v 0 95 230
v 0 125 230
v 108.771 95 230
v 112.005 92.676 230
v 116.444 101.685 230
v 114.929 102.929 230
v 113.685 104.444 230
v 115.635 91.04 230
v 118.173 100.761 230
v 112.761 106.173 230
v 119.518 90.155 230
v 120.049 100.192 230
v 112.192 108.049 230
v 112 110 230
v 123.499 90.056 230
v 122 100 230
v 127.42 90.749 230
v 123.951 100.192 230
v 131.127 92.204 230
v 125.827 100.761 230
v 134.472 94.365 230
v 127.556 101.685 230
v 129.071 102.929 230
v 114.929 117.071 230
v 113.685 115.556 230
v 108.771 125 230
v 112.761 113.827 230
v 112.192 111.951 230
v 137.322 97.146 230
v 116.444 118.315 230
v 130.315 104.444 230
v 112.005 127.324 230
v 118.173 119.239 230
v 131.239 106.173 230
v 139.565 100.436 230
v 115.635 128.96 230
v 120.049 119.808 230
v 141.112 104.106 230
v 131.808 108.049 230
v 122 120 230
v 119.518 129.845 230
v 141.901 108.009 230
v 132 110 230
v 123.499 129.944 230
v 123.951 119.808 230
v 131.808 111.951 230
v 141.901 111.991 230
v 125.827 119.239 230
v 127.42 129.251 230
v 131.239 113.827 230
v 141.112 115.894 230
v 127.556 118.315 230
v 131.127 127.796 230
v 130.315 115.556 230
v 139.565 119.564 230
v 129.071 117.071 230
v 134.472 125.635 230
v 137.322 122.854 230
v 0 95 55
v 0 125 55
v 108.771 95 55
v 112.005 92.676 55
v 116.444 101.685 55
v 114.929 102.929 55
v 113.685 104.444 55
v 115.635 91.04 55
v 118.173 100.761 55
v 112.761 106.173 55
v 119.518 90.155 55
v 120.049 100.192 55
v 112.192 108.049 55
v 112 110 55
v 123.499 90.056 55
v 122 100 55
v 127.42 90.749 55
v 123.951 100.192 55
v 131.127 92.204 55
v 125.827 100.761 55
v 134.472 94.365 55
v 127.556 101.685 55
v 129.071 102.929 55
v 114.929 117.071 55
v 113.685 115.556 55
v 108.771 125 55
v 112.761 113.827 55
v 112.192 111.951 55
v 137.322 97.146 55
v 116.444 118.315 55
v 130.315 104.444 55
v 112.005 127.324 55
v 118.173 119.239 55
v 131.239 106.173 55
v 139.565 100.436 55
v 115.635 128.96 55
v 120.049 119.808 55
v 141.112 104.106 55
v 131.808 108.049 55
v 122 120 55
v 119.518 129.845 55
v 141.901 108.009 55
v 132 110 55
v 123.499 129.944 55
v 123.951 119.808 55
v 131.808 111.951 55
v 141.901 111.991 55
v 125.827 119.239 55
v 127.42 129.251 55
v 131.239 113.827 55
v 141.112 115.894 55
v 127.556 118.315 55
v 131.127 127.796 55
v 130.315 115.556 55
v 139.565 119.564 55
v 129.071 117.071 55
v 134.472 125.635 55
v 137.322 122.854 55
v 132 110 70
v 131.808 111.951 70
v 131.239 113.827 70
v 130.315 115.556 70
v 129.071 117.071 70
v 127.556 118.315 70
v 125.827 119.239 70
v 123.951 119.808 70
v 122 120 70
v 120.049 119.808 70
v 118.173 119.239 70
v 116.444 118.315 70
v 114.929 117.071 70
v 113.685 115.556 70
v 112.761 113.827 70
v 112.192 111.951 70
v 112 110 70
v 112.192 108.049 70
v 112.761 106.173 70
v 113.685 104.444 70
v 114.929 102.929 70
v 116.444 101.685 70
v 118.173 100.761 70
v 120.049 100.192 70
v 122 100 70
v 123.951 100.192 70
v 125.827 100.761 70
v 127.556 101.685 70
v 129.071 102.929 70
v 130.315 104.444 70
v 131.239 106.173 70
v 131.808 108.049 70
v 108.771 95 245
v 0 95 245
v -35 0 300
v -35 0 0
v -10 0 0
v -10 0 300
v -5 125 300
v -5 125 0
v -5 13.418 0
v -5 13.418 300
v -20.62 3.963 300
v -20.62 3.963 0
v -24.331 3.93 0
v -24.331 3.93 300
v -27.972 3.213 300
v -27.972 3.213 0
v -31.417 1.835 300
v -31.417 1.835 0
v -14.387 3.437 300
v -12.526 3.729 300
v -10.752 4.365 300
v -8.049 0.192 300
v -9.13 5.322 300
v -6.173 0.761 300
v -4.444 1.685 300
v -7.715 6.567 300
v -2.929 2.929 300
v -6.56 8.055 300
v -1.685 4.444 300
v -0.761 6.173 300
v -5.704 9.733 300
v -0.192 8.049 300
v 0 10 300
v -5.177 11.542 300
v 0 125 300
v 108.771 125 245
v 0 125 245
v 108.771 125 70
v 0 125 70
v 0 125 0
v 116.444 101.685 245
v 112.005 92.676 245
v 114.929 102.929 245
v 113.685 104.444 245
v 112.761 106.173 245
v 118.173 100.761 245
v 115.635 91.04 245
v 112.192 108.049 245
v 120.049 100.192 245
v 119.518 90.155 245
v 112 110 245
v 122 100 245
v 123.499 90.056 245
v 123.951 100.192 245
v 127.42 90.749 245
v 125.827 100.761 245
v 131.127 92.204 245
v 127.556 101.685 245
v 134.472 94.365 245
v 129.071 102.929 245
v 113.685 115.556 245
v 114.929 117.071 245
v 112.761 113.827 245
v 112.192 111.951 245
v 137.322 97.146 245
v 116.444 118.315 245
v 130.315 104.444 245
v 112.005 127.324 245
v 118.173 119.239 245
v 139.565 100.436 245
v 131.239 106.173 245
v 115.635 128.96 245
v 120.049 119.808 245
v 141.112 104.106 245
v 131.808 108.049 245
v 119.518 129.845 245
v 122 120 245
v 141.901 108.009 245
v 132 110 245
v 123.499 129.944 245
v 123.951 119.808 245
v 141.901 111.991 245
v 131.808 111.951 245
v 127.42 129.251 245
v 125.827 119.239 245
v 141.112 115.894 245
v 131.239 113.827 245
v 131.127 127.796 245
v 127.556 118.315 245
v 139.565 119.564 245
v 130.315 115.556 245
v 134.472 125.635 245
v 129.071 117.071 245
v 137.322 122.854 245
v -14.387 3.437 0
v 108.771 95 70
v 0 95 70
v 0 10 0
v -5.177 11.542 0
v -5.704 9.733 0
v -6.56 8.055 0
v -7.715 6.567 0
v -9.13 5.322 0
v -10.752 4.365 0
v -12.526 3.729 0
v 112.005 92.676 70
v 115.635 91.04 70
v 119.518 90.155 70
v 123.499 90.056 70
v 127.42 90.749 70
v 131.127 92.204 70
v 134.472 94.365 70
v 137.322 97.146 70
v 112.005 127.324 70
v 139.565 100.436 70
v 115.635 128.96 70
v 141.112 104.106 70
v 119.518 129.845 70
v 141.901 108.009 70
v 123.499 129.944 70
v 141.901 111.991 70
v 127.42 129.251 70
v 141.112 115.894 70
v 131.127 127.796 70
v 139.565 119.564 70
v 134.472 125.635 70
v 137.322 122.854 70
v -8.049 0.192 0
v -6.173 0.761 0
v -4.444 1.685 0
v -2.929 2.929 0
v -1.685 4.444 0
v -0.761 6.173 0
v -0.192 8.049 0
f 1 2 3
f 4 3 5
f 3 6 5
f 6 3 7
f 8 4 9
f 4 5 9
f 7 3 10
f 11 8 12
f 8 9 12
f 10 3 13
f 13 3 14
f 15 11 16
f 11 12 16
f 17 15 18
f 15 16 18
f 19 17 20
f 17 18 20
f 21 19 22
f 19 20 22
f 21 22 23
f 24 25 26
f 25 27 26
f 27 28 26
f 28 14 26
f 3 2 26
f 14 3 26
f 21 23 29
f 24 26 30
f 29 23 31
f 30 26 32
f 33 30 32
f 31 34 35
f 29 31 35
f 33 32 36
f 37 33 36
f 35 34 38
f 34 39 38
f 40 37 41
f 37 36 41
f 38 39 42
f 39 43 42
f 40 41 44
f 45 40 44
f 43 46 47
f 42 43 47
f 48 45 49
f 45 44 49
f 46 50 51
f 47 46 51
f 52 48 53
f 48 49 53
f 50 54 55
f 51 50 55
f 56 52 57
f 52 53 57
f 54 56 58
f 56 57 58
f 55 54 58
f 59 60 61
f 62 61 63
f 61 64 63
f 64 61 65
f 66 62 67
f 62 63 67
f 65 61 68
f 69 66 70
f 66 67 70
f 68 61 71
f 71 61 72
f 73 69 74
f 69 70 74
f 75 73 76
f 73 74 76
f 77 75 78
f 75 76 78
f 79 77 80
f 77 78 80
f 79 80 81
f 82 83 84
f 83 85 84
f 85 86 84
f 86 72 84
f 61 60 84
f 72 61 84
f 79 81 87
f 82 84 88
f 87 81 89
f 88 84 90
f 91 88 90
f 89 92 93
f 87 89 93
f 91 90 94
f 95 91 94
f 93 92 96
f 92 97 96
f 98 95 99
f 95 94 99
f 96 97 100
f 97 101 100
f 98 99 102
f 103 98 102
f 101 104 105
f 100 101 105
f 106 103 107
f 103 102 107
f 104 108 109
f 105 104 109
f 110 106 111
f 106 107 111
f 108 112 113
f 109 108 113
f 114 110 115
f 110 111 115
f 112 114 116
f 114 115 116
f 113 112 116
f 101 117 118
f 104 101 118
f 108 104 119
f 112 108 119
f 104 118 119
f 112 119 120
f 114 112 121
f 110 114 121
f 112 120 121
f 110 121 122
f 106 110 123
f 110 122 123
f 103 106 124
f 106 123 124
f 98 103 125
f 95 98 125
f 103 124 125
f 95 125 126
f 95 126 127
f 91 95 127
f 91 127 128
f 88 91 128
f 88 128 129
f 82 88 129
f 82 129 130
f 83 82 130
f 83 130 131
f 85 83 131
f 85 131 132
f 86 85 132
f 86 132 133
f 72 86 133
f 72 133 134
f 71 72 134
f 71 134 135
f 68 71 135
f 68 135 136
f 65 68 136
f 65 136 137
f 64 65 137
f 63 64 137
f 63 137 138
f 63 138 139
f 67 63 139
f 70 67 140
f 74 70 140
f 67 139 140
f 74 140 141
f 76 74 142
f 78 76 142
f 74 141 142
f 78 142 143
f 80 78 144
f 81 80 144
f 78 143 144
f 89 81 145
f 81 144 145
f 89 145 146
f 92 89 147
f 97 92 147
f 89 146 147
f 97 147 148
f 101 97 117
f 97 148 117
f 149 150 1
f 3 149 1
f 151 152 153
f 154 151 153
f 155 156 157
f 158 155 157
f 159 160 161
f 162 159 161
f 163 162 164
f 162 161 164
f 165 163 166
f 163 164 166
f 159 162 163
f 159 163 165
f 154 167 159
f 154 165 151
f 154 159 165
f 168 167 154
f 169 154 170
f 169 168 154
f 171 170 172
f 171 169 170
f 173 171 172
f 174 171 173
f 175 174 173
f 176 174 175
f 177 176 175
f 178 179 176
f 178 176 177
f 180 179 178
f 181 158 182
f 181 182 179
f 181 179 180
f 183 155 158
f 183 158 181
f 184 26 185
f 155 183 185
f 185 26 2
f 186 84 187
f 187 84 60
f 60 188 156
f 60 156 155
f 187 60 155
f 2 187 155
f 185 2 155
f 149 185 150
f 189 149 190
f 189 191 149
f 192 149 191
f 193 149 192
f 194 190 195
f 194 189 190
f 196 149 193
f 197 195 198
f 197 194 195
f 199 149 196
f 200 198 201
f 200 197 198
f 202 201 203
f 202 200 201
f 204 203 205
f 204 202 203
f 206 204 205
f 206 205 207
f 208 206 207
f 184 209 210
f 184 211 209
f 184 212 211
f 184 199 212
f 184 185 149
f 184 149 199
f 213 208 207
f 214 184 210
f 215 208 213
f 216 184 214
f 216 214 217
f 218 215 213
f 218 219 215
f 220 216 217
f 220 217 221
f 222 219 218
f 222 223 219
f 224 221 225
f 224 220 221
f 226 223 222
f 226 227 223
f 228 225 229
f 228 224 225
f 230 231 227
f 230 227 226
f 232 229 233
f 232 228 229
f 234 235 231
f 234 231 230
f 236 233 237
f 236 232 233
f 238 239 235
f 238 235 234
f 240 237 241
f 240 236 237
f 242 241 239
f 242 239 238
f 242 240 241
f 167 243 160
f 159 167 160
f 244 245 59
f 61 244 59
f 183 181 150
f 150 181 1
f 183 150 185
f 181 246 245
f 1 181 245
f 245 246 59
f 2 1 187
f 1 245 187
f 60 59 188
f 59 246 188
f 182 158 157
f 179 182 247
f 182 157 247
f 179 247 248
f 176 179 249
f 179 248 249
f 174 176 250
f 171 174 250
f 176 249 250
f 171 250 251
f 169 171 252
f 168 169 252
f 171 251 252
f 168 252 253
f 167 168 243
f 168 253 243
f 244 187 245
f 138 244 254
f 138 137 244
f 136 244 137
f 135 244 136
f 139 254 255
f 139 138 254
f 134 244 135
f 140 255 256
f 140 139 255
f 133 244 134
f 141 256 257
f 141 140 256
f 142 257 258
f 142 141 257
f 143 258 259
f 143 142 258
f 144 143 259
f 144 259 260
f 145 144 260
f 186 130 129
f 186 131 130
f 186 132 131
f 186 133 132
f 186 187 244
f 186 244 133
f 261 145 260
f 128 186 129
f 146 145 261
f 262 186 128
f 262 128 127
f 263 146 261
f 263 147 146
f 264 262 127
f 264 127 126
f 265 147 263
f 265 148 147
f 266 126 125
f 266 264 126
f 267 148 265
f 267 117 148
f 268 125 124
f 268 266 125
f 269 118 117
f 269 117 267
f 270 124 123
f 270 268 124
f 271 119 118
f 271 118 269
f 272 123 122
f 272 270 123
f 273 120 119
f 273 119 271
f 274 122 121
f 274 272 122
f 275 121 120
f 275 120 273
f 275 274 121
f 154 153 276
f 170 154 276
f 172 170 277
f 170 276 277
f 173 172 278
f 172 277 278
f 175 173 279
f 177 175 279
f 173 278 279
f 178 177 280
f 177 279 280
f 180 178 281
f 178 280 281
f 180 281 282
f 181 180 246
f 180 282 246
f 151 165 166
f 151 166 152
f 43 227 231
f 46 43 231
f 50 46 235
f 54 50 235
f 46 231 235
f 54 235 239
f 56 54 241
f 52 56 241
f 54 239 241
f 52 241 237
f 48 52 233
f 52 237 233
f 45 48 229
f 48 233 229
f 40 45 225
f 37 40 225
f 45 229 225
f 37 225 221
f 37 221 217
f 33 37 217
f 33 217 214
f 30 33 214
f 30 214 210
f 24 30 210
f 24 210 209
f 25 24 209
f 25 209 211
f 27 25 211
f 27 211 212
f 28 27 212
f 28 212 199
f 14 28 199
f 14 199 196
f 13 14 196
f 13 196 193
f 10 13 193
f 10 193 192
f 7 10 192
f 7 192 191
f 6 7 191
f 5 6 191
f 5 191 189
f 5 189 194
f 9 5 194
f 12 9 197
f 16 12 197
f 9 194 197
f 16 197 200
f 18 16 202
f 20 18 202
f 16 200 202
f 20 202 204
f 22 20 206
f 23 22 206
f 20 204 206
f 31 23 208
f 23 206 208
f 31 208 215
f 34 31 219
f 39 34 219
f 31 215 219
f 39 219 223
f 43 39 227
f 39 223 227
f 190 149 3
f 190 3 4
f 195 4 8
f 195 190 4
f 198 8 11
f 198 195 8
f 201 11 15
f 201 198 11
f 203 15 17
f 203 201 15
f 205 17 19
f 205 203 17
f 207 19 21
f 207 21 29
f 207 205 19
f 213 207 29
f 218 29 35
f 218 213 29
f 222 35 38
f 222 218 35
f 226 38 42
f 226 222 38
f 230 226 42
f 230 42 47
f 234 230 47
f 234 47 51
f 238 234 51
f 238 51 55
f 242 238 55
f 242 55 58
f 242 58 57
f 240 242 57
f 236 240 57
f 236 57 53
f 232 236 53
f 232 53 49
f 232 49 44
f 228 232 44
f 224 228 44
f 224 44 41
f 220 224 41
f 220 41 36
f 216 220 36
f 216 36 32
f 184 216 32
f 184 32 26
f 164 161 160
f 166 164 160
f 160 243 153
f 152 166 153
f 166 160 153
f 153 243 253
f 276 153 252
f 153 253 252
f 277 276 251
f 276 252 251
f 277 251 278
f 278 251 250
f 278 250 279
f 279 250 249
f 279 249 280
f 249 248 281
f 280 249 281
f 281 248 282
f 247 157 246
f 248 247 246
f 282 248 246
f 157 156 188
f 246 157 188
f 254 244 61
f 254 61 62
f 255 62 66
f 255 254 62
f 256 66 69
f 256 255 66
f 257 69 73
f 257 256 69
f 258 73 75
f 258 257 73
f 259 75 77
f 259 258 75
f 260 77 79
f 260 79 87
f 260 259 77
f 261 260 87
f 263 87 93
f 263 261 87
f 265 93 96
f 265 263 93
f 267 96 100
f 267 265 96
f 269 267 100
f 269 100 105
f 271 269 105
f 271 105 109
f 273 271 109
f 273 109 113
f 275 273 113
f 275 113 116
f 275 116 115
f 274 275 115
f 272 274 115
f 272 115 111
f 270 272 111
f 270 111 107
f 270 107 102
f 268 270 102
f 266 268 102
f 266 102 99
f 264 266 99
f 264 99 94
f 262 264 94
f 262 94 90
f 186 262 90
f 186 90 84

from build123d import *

# Parameters (mm, degrees)
BOSS_EXTRU_1_DEPTH      = 300
ESQUISSE3_W             = 15
ESQUISSE3_H             = 30
BOSS_EXTRU_2_DEPTH      = 115
ESQUISSE4_R             = 20
BOSS_EXTRU_3_DEPTH      = 15
ESQUISSE6_R             = 20
BOSS_EXTRU_4_DEPTH      = 15
ESQUISSE5_R             = 10
ENL_V_MAT_EXTRU_1_DEPTH = 246


with BuildPart() as part:
    # Esquisse1 → Boss.-Extru.1 (new body)
    with BuildSketch(Plane.XY):
        with BuildLine():
            Line((-5, 125), (-5, 35))
            Line((-5, 35), (-5, 13.417991274))
            ThreePointArc((-5, 13.417991274), (-7.715430946, 6.567075008), (-14.387010739, 3.436796748))
            Line((-14.387010739, 3.436796748), (-20.619947118, 3.962528759))
            ThreePointArc((-20.619947118, 3.962528759), (-26.167850826, 3.655908021), (-31.417293187, 1.834752694))
            Line((-31.417293187, 1.834752694), (-35, 0))
            Line((-35, 0), (-10, 0))
            ThreePointArc((-10, 0), (-2.928932188, 2.928932188), (0, 10))
            Line((0, 10), (0, 30))
            Line((0, 30), (0, 125))
            Line((0, 125), (-5, 125))
        make_face()
    extrude(amount=BOSS_EXTRU_1_DEPTH)

    # Esquisse3 → Boss.-Extru.2 (add)
    with BuildSketch(Plane(origin=(0, 0, 0), x_dir=(0, 0, -1), z_dir=(1, 0, 0))):
        with Locations((-237.5, 110)):
            Rectangle(ESQUISSE3_W, ESQUISSE3_H)
        with Locations((-62.5, 110)):
            Rectangle(ESQUISSE3_W, ESQUISSE3_H)
    extrude(amount=BOSS_EXTRU_2_DEPTH)

    # Esquisse4 → Boss.-Extru.3 (add)
    with BuildSketch(Plane.XY.offset(245)):
        with Locations((122, 110)):
            Circle(ESQUISSE4_R)
    extrude(amount=-BOSS_EXTRU_3_DEPTH)

    # Esquisse6 → Boss.-Extru.4 (add)
    with BuildSketch(Plane.XY.offset(70)):
        with Locations((122, 110)):
            Circle(ESQUISSE6_R)
    extrude(amount=-BOSS_EXTRU_4_DEPTH)

    # Esquisse5 → Enlèv. mat.-Extru.1 (cut, through all)
    with BuildSketch(Plane.XY.offset(245)):
        with Locations((122, 110)):
            Circle(ESQUISSE5_R)
    extrude(amount=-ENL_V_MAT_EXTRU_1_DEPTH, mode=Mode.SUBTRACT)


solid = part.part
